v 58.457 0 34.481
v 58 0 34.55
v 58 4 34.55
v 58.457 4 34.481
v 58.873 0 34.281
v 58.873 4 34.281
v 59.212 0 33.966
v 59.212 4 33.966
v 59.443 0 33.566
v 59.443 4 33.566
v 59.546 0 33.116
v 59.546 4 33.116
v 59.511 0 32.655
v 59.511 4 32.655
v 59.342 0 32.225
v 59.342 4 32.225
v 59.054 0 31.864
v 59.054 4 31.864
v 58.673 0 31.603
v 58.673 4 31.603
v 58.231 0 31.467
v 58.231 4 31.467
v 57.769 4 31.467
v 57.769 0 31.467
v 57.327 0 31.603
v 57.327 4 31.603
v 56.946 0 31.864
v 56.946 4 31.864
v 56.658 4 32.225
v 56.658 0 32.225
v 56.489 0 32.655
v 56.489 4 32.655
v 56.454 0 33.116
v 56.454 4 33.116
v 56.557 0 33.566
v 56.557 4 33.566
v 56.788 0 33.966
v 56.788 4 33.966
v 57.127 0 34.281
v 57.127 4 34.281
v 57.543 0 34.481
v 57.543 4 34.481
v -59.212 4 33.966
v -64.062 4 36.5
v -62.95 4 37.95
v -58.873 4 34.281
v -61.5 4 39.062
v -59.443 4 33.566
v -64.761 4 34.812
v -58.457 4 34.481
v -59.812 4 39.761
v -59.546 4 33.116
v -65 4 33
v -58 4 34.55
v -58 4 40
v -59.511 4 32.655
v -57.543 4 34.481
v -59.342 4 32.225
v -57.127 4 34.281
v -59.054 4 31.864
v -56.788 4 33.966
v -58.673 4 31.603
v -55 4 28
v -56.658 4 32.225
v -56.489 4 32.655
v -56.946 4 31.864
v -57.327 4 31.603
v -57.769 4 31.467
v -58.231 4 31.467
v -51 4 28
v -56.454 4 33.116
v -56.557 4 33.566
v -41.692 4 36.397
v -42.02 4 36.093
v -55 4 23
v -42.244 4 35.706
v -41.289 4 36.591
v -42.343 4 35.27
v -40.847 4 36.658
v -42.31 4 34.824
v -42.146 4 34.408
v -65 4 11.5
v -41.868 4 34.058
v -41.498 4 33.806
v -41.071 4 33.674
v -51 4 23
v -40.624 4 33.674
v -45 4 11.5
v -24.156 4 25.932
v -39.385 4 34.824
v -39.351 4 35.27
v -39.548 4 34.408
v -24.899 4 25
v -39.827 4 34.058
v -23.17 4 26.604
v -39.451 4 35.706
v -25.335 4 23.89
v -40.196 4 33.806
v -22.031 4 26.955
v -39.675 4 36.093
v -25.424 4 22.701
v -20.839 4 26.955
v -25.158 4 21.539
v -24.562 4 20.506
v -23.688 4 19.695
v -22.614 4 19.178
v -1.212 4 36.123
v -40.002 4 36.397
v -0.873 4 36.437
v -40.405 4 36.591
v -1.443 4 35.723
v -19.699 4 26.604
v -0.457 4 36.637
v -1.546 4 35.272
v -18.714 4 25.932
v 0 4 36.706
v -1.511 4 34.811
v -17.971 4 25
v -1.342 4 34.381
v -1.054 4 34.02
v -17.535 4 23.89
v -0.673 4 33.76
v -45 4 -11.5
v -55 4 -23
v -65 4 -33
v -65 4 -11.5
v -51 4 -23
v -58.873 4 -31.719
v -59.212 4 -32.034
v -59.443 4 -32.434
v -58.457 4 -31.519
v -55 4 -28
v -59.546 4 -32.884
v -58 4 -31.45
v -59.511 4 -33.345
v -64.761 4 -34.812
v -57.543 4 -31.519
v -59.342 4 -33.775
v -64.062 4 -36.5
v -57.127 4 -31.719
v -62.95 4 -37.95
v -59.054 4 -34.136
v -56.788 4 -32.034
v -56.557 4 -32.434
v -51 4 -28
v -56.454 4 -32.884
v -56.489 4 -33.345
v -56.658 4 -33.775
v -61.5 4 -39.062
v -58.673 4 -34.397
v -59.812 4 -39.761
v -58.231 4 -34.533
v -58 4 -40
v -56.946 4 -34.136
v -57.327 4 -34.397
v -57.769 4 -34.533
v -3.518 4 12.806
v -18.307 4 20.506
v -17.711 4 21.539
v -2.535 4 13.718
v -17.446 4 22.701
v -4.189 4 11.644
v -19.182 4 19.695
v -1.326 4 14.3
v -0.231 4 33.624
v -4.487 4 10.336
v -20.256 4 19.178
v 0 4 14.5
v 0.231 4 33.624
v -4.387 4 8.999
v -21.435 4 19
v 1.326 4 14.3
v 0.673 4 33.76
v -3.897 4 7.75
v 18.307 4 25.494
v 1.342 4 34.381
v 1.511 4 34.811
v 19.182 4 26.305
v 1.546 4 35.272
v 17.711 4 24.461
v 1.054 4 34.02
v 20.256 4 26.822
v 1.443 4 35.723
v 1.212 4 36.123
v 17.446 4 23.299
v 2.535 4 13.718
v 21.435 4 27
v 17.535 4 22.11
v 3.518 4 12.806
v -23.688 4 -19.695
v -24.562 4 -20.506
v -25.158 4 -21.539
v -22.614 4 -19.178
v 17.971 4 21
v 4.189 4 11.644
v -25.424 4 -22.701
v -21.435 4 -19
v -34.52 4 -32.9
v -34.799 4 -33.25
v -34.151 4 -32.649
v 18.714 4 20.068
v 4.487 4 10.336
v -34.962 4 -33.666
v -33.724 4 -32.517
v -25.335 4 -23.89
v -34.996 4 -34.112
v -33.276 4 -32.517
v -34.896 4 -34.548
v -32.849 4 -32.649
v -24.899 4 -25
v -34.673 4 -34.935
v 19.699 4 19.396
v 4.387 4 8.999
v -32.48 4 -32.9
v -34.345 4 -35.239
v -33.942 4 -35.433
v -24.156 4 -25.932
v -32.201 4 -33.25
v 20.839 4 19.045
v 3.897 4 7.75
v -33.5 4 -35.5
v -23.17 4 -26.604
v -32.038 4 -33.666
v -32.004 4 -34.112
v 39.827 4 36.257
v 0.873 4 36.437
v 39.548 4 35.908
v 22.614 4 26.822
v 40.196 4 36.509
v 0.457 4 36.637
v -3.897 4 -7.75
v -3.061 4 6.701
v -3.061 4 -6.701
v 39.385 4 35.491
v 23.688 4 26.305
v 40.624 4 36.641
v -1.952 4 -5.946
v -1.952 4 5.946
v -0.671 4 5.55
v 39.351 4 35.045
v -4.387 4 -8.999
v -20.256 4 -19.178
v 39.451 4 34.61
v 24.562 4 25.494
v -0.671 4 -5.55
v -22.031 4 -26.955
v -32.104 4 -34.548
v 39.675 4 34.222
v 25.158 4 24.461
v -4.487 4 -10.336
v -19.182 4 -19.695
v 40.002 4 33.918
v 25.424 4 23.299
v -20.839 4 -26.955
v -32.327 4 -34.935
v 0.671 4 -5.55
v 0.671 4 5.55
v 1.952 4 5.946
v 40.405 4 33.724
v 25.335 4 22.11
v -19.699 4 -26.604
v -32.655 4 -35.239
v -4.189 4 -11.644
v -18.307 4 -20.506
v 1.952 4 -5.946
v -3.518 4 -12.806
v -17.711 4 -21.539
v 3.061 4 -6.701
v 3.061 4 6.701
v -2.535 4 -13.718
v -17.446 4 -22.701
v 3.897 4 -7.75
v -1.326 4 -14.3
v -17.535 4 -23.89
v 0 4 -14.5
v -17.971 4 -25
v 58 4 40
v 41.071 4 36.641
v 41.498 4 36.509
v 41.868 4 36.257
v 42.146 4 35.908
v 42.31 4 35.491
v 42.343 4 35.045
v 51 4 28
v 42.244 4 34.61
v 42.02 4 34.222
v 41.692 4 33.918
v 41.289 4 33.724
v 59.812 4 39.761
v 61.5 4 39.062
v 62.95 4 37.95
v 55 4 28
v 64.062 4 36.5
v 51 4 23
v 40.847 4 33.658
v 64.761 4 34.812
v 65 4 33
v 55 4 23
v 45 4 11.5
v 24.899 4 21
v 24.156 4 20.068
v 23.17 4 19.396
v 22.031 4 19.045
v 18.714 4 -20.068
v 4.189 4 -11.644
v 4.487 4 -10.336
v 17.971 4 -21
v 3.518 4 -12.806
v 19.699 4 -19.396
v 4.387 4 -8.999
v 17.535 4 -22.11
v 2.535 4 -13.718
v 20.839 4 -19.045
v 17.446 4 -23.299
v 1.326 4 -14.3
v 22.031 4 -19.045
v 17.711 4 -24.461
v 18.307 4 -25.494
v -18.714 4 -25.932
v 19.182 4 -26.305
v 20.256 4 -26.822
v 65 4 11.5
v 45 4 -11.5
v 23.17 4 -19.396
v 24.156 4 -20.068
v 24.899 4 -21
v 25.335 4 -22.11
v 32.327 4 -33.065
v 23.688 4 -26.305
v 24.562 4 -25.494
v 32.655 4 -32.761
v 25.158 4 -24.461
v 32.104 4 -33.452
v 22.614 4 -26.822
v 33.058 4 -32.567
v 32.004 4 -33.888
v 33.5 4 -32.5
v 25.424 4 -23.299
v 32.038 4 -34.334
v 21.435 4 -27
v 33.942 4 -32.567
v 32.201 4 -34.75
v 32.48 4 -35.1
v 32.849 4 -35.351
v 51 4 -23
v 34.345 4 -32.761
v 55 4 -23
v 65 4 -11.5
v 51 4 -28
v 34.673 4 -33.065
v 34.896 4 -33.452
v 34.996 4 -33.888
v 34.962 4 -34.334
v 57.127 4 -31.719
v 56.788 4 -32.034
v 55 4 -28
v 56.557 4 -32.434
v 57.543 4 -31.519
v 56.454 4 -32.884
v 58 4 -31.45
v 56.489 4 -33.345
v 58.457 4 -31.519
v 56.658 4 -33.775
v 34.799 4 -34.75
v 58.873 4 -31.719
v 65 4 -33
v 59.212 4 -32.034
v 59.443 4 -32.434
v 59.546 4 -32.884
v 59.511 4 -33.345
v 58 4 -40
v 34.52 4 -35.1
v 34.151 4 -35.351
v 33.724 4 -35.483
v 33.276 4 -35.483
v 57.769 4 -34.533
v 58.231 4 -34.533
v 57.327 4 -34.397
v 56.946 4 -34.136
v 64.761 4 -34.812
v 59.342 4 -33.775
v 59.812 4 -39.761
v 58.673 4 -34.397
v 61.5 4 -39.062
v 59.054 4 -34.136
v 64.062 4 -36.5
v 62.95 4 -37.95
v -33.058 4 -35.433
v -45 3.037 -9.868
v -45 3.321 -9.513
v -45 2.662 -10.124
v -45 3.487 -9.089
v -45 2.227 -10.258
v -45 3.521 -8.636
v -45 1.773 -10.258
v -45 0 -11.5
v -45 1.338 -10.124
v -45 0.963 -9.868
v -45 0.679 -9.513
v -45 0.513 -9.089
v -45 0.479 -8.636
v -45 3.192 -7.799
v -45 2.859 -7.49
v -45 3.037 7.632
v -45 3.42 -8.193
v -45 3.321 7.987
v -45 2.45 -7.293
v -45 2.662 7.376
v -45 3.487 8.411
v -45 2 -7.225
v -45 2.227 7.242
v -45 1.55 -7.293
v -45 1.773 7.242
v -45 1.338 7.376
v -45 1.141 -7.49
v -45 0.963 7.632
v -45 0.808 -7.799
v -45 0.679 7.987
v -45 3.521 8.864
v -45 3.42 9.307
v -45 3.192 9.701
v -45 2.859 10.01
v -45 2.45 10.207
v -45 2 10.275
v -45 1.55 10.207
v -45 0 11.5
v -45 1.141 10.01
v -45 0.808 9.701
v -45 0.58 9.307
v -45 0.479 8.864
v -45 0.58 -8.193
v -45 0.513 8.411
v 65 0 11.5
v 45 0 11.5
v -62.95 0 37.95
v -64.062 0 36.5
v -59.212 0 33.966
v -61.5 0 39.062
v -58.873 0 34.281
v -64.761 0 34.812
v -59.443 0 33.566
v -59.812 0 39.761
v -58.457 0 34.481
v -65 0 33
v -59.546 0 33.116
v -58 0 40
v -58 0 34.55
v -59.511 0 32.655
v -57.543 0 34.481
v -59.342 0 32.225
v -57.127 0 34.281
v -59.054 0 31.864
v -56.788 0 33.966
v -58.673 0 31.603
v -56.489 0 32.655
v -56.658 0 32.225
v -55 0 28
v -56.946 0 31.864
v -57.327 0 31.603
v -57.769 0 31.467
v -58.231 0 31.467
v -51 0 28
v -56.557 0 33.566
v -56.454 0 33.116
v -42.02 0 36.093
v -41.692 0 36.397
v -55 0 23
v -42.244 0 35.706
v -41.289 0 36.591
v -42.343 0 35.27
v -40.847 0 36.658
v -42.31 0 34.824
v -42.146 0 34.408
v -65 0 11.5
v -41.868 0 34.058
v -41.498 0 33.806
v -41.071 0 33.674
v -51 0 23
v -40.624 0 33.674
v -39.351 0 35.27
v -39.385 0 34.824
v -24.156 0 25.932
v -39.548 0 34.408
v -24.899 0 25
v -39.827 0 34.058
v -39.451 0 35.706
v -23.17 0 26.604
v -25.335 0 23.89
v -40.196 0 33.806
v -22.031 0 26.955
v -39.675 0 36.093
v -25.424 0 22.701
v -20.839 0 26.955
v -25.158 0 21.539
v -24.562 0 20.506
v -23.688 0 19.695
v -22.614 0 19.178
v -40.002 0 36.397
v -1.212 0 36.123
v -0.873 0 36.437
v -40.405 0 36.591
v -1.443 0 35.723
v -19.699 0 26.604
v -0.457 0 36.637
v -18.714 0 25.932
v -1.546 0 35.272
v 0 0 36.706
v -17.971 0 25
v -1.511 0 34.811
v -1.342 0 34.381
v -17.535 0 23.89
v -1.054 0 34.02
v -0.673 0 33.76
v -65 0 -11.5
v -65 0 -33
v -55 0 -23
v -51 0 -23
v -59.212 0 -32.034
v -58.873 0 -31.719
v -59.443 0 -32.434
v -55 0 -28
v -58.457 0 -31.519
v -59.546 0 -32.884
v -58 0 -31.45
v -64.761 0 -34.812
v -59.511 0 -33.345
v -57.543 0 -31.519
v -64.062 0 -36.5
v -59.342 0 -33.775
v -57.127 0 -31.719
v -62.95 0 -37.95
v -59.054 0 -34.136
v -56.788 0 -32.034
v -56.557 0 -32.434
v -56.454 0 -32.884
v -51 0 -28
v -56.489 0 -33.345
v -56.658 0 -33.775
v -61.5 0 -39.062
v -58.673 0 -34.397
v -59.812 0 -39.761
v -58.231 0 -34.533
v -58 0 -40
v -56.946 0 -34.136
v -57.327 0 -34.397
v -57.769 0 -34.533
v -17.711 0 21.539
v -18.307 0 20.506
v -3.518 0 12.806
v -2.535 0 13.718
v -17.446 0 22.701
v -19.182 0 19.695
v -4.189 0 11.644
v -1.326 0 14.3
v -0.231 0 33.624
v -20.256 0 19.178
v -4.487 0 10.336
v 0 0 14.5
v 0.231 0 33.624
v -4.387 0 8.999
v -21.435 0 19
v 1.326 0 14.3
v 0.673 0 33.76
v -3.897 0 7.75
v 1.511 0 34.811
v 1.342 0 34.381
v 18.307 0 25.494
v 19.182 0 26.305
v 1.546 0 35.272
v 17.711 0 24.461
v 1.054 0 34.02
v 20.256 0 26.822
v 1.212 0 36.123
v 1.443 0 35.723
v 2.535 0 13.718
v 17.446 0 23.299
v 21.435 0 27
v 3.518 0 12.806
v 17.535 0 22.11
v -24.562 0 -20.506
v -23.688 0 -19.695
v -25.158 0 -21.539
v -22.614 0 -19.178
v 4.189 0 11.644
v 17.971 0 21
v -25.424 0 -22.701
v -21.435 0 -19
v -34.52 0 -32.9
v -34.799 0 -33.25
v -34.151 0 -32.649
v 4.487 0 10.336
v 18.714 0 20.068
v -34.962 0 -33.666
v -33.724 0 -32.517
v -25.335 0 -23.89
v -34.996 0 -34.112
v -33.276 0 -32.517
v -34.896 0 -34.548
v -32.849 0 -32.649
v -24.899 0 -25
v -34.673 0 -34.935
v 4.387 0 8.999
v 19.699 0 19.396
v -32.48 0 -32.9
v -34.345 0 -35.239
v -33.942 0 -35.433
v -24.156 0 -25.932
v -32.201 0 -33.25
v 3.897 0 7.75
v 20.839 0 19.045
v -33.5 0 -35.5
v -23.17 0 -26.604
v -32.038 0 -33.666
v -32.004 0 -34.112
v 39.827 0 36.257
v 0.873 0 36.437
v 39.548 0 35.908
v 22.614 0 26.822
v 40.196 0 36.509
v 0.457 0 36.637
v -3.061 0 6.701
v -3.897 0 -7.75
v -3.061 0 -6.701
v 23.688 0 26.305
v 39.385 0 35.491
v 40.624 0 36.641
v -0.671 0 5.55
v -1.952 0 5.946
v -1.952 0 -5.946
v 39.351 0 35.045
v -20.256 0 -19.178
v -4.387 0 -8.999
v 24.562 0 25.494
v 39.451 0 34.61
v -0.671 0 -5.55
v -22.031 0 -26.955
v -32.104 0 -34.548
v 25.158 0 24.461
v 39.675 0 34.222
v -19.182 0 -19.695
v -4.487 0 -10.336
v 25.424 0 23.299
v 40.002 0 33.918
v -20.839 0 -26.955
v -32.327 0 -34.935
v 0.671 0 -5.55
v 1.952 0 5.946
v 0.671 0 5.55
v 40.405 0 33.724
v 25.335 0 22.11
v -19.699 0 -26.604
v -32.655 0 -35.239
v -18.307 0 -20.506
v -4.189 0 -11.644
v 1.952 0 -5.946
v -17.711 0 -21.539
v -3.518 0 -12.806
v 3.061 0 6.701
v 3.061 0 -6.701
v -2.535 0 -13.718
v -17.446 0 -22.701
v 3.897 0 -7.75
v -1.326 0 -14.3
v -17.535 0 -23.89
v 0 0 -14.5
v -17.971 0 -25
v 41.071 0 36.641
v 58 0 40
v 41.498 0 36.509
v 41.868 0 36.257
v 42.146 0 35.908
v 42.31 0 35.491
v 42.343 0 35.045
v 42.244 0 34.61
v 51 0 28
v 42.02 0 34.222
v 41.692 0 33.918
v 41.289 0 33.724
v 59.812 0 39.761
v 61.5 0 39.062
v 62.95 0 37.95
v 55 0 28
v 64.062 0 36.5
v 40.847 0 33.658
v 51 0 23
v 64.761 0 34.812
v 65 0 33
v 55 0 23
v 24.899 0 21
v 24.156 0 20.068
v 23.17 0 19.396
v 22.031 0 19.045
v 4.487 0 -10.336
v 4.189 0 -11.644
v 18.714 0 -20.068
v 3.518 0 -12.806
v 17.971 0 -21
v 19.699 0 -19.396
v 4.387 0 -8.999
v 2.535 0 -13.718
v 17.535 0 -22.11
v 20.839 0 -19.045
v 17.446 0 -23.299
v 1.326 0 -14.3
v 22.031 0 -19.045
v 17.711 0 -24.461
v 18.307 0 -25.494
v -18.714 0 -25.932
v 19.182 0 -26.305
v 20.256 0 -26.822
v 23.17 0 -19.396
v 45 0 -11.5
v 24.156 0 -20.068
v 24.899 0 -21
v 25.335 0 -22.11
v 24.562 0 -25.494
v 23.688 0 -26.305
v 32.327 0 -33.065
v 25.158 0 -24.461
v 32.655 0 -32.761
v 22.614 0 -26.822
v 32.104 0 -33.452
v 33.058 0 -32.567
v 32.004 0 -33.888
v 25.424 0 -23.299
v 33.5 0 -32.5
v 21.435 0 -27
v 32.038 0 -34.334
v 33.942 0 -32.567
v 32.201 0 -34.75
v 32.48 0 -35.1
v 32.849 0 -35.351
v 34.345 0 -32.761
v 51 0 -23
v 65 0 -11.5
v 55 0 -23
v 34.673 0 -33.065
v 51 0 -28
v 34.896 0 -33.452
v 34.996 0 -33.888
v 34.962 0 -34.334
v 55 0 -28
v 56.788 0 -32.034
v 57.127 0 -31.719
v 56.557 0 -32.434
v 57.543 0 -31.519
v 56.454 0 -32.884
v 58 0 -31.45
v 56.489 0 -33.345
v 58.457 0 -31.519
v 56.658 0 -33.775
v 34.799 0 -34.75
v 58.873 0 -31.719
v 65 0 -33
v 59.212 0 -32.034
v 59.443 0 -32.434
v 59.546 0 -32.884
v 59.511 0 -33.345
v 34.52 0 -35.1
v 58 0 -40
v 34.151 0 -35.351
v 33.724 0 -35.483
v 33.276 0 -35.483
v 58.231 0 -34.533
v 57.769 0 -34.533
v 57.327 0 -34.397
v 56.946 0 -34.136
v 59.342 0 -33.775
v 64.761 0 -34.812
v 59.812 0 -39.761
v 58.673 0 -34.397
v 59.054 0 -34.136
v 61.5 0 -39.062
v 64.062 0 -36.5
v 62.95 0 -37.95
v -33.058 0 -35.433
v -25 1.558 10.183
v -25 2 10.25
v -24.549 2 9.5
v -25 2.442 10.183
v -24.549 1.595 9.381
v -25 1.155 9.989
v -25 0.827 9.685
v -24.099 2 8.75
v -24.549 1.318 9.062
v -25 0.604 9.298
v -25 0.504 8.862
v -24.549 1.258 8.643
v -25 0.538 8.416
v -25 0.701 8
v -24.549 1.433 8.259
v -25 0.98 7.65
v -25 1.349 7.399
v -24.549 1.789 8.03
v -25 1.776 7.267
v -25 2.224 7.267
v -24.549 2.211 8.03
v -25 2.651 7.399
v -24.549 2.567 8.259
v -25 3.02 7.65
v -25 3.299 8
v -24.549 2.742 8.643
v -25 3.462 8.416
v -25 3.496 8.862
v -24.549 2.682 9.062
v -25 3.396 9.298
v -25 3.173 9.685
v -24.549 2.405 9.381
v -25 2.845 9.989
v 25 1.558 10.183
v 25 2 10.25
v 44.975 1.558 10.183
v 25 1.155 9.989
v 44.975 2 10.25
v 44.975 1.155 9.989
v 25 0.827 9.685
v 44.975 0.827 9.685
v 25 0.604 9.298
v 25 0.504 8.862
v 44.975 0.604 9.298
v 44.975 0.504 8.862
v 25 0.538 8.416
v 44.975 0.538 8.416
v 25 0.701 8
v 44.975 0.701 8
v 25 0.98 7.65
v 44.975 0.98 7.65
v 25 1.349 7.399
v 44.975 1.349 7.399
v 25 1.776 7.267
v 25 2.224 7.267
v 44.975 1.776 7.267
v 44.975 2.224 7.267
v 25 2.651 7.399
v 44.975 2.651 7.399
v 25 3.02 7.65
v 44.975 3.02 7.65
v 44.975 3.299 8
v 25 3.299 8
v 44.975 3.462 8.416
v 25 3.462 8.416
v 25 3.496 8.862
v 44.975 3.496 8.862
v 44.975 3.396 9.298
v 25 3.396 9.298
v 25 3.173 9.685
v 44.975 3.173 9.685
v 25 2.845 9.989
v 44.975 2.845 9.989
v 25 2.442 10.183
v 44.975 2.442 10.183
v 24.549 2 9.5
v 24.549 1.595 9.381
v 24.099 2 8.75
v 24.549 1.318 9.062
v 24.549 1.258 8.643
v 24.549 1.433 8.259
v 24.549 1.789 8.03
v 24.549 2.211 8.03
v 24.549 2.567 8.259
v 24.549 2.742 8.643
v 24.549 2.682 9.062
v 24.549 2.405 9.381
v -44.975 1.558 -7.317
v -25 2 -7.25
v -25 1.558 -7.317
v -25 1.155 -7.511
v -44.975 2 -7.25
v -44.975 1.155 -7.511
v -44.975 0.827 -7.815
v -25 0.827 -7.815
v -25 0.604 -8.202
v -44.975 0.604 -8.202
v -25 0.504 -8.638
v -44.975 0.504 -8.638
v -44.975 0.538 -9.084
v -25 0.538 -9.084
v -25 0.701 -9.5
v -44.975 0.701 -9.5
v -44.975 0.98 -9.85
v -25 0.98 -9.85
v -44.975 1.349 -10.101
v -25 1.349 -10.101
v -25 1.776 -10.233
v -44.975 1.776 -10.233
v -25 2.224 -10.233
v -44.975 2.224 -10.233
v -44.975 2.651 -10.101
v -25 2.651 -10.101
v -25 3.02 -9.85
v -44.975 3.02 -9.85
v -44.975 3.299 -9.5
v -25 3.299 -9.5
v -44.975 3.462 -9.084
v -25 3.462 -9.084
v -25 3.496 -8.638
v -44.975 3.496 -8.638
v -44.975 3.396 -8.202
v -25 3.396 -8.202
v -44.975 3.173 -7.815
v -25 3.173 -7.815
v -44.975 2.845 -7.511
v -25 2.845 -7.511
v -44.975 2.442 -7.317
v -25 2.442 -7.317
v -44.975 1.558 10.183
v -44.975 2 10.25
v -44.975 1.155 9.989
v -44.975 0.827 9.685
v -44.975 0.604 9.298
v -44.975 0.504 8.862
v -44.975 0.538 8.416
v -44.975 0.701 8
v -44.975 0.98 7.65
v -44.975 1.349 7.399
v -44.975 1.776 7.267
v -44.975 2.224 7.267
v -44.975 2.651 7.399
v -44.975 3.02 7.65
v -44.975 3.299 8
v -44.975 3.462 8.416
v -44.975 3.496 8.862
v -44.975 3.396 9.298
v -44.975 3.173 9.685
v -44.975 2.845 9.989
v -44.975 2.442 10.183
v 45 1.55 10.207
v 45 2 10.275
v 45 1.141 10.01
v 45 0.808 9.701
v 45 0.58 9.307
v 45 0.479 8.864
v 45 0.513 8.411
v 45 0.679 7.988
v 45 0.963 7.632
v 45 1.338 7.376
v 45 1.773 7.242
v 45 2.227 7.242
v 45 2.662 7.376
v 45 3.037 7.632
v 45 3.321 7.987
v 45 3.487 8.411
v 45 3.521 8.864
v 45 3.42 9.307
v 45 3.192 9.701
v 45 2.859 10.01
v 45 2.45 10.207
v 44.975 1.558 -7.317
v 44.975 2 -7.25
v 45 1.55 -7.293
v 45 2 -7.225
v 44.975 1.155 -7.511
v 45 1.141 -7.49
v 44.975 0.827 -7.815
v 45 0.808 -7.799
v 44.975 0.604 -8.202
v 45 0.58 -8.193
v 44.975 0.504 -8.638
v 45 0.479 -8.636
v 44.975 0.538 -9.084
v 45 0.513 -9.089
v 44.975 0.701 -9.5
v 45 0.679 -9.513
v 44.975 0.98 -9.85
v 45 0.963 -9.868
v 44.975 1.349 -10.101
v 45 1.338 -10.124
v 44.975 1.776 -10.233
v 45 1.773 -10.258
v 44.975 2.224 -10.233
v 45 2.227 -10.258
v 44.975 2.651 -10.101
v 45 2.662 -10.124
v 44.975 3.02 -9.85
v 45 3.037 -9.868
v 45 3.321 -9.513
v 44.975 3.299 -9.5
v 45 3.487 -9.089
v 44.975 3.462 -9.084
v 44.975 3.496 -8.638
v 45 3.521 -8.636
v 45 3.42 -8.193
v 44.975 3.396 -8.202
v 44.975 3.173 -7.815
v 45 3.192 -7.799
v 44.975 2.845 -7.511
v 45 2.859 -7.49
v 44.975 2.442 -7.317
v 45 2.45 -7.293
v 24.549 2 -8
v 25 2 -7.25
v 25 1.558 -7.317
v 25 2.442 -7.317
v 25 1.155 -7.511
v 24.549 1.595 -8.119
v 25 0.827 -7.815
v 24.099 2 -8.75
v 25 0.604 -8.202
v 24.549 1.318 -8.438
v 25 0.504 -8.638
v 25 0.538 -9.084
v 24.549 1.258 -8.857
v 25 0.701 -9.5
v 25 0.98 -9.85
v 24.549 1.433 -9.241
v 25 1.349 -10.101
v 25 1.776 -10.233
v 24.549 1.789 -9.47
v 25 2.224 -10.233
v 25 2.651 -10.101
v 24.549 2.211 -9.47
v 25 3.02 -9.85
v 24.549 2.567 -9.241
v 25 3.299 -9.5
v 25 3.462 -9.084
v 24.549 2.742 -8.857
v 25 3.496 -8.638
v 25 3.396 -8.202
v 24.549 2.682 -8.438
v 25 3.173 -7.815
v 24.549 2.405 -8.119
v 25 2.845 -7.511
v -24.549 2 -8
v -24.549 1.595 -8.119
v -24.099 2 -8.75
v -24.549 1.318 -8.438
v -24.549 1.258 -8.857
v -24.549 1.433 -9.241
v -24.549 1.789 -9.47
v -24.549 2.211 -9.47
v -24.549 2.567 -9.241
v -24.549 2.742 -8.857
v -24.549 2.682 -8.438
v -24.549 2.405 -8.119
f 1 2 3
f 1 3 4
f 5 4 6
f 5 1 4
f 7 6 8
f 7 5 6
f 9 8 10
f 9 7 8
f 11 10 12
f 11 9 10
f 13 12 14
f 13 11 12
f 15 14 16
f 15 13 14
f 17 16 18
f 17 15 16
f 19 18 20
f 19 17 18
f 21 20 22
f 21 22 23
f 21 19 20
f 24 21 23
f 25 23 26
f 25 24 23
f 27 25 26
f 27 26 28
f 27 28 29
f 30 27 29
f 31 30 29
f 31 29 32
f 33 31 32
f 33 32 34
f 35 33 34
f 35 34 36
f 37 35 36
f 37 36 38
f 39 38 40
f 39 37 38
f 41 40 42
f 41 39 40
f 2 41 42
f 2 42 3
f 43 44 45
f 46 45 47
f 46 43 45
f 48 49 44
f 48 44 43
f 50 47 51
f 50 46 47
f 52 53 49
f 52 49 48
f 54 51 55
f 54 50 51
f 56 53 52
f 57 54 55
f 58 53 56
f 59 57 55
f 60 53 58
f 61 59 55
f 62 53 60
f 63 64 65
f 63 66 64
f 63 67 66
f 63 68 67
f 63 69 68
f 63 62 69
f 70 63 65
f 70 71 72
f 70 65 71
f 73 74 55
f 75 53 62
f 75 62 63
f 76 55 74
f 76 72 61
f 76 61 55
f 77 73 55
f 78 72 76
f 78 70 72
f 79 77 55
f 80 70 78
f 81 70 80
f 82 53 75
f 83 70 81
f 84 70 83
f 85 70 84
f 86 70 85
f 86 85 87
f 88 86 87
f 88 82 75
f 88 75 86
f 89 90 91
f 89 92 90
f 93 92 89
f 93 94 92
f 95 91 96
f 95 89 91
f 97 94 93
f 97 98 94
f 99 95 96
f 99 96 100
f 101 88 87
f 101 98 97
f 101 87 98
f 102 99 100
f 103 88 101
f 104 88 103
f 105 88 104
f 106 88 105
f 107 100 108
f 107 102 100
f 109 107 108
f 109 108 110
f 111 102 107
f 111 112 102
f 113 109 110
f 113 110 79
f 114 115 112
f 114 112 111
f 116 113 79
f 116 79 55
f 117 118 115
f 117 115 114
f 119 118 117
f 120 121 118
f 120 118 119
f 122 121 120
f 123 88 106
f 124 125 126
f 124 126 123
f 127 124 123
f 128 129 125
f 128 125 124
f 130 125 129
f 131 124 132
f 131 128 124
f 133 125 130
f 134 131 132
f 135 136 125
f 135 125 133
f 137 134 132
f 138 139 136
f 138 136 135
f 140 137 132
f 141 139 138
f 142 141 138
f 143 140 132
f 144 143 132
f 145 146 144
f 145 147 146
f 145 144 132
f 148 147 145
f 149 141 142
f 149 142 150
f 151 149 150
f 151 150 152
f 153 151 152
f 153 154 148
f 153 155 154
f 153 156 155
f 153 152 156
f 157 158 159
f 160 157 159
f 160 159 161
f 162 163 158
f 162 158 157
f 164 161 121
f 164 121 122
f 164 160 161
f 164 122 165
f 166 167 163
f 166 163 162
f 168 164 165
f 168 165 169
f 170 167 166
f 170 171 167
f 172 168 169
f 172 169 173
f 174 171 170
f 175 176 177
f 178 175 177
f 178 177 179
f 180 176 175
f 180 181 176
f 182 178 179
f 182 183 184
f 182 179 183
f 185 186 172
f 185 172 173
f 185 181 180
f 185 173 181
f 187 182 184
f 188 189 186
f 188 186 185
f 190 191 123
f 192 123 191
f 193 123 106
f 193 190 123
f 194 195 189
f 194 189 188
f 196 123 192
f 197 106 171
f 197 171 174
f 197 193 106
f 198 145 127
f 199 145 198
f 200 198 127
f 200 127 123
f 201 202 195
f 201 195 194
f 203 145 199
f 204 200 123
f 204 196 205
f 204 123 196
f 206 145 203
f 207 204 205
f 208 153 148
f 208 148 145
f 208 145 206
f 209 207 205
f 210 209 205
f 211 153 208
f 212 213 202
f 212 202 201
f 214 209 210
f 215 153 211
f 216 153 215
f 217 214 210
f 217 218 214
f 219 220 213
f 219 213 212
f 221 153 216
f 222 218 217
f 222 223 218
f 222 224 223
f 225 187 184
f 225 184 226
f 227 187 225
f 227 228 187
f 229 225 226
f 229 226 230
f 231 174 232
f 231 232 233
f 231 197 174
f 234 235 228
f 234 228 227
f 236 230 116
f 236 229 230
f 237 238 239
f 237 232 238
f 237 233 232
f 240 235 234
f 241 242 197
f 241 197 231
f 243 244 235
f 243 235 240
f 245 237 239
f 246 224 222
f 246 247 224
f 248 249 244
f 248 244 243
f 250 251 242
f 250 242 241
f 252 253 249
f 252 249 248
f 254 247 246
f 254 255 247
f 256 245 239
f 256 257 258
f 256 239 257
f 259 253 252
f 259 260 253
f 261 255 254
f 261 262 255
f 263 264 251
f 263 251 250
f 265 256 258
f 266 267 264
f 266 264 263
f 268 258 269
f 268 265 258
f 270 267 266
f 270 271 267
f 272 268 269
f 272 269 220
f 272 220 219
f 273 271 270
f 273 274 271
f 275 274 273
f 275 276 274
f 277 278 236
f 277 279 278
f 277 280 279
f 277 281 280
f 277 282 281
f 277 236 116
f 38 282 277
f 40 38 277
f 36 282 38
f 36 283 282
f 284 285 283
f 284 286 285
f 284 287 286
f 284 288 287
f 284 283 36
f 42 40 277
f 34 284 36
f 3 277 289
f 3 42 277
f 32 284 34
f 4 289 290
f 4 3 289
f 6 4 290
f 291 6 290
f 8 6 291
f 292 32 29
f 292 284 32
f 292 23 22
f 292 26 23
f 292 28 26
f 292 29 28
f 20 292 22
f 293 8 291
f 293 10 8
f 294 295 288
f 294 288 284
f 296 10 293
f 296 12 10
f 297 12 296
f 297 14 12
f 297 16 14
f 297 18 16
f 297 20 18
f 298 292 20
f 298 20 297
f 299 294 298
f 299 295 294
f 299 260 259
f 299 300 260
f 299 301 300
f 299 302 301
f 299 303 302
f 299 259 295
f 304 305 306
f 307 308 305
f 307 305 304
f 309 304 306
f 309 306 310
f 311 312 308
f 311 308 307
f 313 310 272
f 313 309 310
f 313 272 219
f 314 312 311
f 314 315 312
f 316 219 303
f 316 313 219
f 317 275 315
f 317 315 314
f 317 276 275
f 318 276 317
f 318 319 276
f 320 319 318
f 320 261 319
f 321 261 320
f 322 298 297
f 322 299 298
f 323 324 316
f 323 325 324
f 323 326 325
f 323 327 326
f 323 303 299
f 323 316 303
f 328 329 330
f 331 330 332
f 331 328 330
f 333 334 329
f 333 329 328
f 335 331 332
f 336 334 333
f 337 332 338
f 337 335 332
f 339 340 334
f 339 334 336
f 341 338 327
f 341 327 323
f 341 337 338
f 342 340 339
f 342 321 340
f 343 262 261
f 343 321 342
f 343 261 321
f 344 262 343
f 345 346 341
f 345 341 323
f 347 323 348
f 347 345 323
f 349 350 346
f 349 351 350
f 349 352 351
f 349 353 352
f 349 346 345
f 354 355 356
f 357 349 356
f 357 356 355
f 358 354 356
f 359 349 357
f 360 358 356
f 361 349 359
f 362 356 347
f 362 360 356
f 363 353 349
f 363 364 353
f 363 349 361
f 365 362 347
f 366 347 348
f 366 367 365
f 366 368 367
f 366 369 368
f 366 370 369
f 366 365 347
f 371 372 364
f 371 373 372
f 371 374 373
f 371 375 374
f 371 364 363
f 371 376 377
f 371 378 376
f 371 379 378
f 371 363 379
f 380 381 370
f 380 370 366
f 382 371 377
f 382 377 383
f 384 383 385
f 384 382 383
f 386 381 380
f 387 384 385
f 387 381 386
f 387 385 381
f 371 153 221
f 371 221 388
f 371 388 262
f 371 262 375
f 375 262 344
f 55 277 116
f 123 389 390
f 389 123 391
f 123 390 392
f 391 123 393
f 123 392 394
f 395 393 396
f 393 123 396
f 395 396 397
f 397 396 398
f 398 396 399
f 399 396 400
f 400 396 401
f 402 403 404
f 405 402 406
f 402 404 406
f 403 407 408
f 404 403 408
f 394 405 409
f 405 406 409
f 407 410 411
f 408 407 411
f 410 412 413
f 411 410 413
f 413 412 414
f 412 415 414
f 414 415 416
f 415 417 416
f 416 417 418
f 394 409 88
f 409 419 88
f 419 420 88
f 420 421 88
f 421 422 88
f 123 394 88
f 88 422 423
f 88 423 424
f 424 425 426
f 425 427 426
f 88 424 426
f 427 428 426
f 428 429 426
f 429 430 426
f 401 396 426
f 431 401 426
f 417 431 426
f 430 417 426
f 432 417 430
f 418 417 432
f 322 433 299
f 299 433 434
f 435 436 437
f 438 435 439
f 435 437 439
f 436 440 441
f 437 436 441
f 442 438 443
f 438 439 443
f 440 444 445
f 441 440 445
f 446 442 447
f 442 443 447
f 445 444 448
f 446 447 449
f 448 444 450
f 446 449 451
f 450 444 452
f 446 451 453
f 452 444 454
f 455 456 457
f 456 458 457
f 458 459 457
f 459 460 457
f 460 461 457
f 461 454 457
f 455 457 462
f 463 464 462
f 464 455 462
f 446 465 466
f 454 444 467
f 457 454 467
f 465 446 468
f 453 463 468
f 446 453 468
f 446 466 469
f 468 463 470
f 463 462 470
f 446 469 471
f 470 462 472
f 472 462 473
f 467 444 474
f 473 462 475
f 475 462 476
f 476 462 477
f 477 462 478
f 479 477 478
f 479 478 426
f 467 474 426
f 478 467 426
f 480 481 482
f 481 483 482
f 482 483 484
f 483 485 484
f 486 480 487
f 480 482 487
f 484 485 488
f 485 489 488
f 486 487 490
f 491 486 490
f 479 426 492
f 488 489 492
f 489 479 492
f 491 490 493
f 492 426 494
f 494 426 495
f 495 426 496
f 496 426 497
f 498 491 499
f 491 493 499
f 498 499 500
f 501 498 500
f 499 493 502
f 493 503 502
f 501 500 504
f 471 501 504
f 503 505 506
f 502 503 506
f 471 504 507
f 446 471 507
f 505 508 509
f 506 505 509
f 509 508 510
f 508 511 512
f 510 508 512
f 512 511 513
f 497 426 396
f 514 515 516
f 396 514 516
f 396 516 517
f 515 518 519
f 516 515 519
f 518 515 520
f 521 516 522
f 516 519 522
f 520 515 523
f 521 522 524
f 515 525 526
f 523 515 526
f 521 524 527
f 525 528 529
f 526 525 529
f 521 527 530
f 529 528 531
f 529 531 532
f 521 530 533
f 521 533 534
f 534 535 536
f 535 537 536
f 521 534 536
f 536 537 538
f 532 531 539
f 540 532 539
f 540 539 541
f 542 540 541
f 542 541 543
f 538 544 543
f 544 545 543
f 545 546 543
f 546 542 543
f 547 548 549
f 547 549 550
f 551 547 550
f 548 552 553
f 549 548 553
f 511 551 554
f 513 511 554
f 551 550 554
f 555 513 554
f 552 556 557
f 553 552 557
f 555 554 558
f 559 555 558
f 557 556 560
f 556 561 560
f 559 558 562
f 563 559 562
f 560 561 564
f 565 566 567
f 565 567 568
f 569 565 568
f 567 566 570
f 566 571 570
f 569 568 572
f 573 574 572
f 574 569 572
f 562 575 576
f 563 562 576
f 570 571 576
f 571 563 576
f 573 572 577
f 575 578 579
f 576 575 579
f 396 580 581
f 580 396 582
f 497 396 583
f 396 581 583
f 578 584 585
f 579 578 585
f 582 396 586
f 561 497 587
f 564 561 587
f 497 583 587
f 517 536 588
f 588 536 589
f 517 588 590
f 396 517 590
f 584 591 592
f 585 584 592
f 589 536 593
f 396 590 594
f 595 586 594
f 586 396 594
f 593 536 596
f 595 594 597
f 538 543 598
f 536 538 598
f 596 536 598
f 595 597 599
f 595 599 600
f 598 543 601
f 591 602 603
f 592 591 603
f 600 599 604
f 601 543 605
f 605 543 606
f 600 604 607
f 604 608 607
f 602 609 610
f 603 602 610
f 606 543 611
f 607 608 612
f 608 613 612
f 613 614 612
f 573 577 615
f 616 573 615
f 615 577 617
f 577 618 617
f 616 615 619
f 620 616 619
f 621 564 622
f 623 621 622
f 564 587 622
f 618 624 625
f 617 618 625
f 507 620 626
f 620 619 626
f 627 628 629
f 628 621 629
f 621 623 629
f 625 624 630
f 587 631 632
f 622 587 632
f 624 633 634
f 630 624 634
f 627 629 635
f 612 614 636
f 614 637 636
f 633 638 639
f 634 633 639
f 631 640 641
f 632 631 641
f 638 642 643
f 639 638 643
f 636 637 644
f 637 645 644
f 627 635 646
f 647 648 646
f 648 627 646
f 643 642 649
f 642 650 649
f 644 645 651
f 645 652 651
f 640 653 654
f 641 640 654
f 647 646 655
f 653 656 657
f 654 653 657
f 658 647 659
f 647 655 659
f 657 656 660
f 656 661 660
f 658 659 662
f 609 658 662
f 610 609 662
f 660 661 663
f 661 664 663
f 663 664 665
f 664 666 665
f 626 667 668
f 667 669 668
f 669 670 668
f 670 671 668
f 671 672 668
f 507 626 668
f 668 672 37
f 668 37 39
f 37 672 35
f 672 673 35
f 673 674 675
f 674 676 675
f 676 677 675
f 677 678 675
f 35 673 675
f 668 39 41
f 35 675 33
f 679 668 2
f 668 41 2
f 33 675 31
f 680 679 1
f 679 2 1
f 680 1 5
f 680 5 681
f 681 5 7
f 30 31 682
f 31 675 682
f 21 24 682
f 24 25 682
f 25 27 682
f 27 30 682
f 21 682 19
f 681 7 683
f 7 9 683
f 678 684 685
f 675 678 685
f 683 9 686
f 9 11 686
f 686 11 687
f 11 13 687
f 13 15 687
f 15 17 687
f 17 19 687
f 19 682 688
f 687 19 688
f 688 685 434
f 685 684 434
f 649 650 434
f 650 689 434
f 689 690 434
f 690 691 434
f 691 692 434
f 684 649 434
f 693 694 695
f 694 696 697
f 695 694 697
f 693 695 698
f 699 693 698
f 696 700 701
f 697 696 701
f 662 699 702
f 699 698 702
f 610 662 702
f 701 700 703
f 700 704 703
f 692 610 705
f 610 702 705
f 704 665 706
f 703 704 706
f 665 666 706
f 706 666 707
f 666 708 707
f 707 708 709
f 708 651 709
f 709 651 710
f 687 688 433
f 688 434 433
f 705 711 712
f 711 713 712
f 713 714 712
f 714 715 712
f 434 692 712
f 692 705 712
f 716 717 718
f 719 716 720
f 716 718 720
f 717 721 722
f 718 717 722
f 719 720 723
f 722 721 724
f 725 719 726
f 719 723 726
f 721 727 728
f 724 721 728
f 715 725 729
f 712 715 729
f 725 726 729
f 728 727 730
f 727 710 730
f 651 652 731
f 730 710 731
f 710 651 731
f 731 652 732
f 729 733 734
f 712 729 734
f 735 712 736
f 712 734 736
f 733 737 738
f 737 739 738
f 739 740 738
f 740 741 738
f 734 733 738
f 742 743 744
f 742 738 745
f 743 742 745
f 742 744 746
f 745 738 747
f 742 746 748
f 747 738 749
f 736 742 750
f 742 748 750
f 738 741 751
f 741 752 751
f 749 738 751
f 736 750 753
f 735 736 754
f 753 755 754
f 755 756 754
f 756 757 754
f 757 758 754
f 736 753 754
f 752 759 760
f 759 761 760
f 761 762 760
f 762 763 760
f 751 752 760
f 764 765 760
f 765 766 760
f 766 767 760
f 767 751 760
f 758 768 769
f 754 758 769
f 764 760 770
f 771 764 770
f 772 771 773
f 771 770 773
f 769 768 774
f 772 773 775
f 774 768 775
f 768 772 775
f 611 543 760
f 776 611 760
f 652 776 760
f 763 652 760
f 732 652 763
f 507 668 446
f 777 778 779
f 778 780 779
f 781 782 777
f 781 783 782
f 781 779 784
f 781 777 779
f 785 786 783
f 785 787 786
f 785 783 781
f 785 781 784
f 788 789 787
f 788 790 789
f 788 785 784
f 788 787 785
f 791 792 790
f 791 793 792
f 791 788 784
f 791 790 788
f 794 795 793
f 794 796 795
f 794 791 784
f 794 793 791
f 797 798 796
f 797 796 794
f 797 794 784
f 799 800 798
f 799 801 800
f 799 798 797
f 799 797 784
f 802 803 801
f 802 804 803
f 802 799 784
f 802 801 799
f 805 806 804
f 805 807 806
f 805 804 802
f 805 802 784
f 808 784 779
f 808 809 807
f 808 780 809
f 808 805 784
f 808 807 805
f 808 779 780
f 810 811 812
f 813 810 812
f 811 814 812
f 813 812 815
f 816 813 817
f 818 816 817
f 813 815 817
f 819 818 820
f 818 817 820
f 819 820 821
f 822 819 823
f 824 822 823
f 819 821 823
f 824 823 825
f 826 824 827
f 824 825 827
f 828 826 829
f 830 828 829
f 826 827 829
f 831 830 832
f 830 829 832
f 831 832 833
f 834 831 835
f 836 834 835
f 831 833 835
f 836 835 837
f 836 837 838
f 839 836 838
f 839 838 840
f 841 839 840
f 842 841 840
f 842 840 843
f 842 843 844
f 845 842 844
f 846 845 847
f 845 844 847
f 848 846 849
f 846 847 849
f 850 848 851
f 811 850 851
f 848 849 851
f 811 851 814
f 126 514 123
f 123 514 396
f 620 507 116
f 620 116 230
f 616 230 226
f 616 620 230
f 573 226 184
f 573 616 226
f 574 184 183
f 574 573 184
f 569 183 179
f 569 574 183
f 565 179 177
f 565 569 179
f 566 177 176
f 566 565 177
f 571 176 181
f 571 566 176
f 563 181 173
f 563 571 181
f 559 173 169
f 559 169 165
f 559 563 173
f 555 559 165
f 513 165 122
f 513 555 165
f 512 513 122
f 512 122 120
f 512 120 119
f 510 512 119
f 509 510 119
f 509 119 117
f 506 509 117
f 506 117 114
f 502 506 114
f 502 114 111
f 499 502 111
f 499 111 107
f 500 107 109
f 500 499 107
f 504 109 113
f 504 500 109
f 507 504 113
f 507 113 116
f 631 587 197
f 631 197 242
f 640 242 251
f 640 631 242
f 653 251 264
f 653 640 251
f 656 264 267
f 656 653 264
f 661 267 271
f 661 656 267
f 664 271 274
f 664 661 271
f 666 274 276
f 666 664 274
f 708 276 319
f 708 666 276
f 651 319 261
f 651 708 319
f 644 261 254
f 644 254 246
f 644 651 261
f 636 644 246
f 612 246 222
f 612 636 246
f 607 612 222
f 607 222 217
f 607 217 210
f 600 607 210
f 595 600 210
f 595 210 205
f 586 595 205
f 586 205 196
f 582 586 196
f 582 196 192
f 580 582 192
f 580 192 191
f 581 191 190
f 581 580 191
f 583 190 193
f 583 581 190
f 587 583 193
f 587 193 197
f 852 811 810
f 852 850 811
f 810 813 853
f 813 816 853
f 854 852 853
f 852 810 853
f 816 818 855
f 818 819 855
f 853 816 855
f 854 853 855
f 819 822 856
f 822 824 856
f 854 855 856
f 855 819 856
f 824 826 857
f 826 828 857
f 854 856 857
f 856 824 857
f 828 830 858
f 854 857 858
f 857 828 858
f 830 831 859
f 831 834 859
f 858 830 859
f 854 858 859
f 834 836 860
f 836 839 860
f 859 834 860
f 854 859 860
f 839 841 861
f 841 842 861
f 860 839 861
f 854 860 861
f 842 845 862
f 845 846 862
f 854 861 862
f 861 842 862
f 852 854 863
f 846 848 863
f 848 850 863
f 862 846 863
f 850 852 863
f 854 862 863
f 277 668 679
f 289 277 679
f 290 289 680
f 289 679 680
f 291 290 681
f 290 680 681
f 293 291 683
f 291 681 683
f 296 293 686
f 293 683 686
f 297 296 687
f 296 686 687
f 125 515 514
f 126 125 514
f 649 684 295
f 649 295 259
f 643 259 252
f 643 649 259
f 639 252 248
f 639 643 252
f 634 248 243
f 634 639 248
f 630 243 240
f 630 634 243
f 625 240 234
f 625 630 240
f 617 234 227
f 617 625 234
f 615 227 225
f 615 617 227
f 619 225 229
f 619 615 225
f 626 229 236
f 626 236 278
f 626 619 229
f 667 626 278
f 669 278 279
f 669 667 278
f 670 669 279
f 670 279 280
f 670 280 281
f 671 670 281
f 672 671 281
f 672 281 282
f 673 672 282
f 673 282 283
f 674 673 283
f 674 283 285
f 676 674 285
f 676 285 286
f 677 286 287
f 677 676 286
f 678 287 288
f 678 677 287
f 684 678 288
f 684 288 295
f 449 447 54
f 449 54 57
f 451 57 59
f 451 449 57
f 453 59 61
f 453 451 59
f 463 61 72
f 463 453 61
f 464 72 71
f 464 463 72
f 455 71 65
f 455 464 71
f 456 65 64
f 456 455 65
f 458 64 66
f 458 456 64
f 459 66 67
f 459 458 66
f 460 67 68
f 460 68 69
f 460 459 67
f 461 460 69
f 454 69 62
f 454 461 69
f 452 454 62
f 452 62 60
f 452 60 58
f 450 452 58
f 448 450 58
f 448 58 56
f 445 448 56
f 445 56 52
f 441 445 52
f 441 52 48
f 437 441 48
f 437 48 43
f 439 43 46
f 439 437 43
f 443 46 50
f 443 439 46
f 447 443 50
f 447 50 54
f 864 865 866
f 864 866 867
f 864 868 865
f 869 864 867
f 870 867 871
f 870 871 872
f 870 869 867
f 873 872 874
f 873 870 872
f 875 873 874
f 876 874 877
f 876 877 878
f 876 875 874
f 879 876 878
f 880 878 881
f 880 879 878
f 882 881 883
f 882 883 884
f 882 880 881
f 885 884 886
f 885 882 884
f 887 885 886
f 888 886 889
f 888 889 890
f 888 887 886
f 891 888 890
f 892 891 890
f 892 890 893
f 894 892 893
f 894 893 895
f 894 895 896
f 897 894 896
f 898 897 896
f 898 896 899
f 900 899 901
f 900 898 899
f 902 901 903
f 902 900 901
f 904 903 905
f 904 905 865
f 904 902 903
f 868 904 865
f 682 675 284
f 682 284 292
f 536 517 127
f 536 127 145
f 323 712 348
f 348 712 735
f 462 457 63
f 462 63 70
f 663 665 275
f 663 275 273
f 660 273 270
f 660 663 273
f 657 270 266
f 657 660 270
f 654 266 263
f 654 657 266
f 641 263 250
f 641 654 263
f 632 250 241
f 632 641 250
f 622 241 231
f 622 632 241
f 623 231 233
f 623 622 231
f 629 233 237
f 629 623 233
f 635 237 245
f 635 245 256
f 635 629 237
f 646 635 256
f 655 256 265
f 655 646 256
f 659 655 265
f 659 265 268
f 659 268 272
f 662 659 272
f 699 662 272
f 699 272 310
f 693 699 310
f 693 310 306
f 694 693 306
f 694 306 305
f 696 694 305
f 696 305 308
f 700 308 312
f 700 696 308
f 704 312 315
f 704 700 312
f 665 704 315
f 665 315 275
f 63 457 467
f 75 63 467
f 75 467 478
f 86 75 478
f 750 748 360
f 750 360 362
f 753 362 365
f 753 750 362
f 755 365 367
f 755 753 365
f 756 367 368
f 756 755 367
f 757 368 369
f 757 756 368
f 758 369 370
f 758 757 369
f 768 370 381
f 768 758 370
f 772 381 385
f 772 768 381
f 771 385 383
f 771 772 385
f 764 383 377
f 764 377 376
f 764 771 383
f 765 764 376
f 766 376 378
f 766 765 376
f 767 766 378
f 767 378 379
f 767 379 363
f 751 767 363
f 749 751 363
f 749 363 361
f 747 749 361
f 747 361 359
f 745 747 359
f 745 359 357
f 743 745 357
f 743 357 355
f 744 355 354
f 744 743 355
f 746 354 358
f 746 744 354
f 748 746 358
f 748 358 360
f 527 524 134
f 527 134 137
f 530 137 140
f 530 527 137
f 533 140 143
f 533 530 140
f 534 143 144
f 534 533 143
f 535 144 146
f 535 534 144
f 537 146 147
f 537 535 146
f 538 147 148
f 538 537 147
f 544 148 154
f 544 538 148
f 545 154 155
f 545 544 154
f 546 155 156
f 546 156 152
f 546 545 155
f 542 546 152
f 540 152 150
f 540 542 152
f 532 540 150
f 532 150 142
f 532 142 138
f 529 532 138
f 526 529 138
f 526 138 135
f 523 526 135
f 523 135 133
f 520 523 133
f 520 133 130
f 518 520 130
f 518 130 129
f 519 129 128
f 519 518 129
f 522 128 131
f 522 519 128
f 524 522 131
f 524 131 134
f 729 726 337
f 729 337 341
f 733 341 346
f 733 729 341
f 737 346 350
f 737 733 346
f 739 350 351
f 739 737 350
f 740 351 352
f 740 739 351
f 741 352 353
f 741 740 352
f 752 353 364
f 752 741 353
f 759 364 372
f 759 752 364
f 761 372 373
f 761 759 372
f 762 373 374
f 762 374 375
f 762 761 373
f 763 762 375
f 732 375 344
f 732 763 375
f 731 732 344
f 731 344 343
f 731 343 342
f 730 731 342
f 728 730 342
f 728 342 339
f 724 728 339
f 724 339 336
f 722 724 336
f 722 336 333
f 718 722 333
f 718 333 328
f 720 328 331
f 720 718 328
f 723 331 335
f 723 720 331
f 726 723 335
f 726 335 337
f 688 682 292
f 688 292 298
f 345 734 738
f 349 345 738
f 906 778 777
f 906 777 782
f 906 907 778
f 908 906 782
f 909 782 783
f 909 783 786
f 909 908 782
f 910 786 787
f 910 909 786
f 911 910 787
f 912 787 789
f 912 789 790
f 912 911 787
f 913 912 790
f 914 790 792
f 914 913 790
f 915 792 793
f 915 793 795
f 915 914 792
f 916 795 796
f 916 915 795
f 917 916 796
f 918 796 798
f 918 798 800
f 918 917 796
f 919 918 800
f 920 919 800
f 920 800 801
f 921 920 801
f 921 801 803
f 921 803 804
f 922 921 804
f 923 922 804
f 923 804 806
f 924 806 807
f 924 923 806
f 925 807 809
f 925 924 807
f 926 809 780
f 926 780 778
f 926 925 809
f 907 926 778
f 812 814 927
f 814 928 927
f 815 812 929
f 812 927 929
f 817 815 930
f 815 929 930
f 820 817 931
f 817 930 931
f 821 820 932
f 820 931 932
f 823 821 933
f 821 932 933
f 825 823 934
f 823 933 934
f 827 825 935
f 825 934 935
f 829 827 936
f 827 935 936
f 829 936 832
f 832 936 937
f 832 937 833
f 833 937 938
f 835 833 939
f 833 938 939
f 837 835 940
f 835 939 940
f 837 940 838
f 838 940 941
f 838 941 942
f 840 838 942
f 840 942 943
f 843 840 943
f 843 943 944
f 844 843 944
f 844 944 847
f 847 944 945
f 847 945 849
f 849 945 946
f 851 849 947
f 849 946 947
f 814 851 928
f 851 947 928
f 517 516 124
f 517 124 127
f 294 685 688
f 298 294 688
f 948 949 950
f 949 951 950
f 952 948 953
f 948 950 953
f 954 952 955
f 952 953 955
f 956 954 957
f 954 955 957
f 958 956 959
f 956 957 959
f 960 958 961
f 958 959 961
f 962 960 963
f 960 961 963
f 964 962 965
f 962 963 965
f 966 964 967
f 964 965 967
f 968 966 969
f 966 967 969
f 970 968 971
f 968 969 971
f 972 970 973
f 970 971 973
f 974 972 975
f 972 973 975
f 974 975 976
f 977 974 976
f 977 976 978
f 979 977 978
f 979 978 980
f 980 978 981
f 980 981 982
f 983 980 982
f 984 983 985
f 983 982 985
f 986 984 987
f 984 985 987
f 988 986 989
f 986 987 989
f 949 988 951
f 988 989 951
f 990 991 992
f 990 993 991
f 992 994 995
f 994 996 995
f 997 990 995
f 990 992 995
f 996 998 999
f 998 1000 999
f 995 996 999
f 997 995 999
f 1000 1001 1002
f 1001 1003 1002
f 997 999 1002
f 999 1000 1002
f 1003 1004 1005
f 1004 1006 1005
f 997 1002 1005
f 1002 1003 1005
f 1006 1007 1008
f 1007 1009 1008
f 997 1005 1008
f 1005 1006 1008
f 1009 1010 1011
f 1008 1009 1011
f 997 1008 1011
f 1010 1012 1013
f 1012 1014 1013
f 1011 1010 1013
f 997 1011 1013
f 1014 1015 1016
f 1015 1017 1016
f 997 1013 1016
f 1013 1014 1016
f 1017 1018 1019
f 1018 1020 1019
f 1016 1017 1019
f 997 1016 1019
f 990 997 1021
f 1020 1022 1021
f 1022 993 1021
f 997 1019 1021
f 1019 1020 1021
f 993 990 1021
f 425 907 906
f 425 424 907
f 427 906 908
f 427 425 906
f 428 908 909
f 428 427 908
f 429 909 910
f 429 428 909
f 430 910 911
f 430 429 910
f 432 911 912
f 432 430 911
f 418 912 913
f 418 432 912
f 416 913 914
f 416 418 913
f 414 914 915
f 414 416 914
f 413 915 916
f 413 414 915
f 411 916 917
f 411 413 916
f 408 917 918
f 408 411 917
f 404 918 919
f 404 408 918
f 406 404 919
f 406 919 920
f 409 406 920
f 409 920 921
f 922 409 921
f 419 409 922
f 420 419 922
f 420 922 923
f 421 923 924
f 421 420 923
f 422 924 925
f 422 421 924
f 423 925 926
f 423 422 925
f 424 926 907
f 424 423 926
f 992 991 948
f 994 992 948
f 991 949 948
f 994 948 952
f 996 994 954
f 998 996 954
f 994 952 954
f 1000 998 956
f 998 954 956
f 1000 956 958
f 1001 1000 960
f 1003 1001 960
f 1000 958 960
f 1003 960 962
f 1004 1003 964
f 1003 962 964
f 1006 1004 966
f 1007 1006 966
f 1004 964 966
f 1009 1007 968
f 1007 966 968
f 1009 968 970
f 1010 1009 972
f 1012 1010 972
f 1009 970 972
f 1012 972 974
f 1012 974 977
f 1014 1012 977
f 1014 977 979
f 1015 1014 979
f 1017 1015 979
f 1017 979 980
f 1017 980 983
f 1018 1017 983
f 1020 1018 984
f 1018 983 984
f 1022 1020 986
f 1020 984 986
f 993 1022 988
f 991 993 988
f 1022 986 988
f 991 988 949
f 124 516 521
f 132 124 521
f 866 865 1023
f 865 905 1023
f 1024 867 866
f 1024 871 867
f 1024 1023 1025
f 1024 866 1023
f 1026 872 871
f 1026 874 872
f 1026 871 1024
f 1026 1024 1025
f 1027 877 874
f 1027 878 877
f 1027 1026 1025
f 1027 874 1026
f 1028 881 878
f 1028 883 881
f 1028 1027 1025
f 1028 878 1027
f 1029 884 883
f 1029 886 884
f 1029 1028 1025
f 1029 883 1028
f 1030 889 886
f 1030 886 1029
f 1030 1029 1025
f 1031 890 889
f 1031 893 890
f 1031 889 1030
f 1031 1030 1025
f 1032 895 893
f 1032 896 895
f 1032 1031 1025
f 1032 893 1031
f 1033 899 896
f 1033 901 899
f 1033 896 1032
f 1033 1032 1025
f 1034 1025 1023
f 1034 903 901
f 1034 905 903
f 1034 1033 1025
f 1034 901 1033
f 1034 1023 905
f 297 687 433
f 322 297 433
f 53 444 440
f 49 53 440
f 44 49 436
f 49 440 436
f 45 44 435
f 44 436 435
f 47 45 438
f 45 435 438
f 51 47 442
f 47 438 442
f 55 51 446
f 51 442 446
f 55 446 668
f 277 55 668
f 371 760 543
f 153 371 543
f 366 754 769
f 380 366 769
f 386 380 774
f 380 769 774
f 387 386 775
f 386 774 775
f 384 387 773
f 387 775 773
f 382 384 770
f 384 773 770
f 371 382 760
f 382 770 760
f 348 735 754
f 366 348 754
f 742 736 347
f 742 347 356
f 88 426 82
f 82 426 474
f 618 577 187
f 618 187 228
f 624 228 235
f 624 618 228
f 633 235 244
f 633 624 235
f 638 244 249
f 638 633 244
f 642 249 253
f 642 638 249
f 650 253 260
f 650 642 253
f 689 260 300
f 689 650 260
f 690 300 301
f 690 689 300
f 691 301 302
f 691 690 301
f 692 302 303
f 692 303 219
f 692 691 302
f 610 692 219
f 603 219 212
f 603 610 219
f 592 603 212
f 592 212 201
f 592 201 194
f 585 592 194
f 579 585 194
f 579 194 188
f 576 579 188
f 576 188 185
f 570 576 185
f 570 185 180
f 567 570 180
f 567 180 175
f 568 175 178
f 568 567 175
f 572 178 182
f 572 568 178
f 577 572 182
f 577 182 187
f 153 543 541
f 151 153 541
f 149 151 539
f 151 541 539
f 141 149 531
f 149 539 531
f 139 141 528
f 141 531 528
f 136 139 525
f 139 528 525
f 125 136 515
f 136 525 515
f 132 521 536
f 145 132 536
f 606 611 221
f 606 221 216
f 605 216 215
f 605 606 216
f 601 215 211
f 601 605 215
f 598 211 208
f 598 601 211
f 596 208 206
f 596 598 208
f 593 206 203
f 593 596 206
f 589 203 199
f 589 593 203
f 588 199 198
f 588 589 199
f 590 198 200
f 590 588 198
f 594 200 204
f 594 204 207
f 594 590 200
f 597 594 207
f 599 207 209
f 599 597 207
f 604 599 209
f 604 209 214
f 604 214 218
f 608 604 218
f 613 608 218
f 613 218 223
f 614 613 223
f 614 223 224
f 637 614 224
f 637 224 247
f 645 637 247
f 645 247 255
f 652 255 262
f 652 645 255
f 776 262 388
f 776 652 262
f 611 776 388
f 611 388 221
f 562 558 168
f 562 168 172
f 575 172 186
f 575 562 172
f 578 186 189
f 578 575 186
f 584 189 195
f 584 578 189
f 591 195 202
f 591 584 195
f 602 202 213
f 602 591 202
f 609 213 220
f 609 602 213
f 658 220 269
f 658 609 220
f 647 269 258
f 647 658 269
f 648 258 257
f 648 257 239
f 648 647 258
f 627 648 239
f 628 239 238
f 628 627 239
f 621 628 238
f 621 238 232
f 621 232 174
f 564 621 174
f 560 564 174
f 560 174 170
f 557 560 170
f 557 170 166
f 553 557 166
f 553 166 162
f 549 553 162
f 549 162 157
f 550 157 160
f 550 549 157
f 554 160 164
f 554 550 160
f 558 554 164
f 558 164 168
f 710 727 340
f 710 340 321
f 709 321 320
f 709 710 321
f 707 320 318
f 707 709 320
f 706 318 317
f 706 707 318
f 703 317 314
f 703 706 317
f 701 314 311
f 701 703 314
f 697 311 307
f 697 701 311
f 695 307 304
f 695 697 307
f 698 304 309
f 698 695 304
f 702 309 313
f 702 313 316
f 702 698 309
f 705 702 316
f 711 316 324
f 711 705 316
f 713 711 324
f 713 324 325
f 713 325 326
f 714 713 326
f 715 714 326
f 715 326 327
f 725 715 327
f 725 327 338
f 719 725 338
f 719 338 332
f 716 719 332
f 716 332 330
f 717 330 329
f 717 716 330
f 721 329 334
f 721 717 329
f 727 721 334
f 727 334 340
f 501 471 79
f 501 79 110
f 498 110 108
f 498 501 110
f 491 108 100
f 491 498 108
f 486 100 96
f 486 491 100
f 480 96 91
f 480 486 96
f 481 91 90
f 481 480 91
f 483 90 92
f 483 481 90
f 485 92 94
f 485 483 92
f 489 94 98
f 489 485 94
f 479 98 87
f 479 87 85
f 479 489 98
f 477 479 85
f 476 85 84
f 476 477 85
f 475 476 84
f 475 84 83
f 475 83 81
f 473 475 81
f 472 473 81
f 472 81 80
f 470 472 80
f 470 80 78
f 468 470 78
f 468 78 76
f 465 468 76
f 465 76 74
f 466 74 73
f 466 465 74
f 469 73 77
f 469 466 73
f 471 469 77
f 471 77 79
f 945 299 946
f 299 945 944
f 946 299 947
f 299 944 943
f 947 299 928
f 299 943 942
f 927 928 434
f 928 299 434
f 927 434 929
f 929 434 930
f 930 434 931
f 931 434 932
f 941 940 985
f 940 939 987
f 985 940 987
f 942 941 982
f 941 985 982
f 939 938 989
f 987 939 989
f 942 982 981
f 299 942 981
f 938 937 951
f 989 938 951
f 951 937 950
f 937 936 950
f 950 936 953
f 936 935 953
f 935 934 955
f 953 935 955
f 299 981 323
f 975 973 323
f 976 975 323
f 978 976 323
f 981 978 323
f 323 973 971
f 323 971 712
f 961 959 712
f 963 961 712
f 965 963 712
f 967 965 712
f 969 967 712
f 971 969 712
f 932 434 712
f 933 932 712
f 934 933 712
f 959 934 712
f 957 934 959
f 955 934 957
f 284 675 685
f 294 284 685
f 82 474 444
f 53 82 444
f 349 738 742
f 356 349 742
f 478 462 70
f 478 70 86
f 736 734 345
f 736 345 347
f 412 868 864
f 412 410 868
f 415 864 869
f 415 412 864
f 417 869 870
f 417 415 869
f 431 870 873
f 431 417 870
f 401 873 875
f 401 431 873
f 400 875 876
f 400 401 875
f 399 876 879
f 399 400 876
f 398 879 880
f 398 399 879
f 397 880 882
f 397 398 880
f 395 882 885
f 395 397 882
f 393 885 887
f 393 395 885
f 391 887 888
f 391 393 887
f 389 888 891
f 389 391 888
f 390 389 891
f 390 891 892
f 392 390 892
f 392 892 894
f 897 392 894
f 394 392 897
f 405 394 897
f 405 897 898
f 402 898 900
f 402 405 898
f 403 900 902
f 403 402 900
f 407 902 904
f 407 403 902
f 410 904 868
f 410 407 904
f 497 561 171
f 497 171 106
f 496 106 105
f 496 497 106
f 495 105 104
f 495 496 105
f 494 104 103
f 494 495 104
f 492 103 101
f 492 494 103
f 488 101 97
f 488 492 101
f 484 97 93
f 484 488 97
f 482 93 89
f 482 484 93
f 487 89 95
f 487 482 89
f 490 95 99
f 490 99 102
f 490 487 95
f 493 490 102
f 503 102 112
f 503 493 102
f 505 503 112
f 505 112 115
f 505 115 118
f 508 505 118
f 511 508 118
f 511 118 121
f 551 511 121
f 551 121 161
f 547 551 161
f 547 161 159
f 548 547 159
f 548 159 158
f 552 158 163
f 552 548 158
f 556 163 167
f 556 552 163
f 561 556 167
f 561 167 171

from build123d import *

# Parameters (mm, degrees)
SKETCH1_R                = 1.55
SKETCH1_R_2              = 1.5
SKETCH1_R_3              = 4.5
SKETCH1_R_4              = 4
SKETCH1_W                = 4
SKETCH1_H                = 5
BOSS_EXTRUDE1_DEPTH      = 4
OTW_R_3_0_3_1_AT_2_COUNT = 2
OTW_R_3_0_3_1_AT_2_PITCH = 17.5


with BuildPart() as part:
    # Sketch1 → Boss-Extrude1 (new body)
    with BuildSketch(Plane(origin=(0, 0, 0), x_dir=(1, 0, 0), z_dir=(0, 1, 0))):
        with BuildLine():
            Line((45, -11.5), (45, 11.5))
            Line((45, 11.5), (65, 11.5))
            Line((65, 11.5), (65, 33))
            ThreePointArc((65, 33), (62.949747468, 37.949747468), (58, 40))
            Line((58, 40), (-58, 40))
            ThreePointArc((-58, 40), (-62.949747468, 37.949747468), (-65, 33))
            Line((-65, 33), (-65, 11.5))
            Line((-65, 11.5), (-45, 11.5))
            Line((-45, 11.5), (-45, -11.5))
            Line((-45, -11.5), (-65, -11.5))
            Line((-65, -11.5), (-65, -33))
            ThreePointArc((-65, -33), (-62.949747468, -37.949747468), (-58, -40))
            Line((-58, -40), (58, -40))
            ThreePointArc((58, -40), (62.949747468, -37.949747468), (65, -33))
            Line((65, -33), (65, -11.5))
            Line((65, -11.5), (45, -11.5))
        make_face()
        with Locations(Location((58, 33, 0), (0, 0, 270))):
            Circle(SKETCH1_R, mode=Mode.SUBTRACT)
        with Locations(Location((58, -33, 0), (0, 0, 270))):
            Circle(SKETCH1_R, mode=Mode.SUBTRACT)
        with Locations(Location((-58, -33, 0), (0, 0, 270))):
            Circle(SKETCH1_R, mode=Mode.SUBTRACT)
        with Locations(Location((-58, 33, 0), (0, 0, 270))):
            Circle(SKETCH1_R, mode=Mode.SUBTRACT)
        with Locations(Location((33.5, 34, 0), (0, 0, 270))):
            Circle(SKETCH1_R_2, mode=Mode.SUBTRACT)
        with Locations(Location((-33.5, 34, 0), (0, 0, 90))):
            Circle(SKETCH1_R_2, mode=Mode.SUBTRACT)
        with Locations(Location((-40.847291444, -35.157580257, 0), (0, 0, 270))):
            Circle(SKETCH1_R_2, mode=Mode.SUBTRACT)
        with Locations(Location((0, -35.15624759, 0), (0, 0, 270))):
            Circle(SKETCH1_R, mode=Mode.SUBTRACT)
        with Locations(Location((40.847291444, -35.157580257, 0), (0, 0, 90))):
            Circle(SKETCH1_R_2, mode=Mode.SUBTRACT)
        with Locations(Location((0, -10, 0), (0, 0, 270))):
            Circle(SKETCH1_R_3, mode=Mode.SUBTRACT)
        with Locations(Location((0, 10, 0), (0, 0, 90))):
            Circle(SKETCH1_R_3, mode=Mode.SUBTRACT)
        with Locations(Location((21.434820624, -23, 0), (0, 0, 270))):
            Circle(SKETCH1_R_4, mode=Mode.SUBTRACT)
        with Locations(Location((-21.434820624, -23, 0), (0, 0, 90))):
            Circle(SKETCH1_R_4, mode=Mode.SUBTRACT)
        with Locations(Location((-21.434820624, 23, 0), (0, 0, 270))):
            Circle(SKETCH1_R_4, mode=Mode.SUBTRACT)
        with Locations(Location((21.434820624, 23, 0), (0, 0, 90))):
            Circle(SKETCH1_R_4, mode=Mode.SUBTRACT)
        with Locations((53, -25.5)):
            Rectangle(SKETCH1_W, SKETCH1_H, mode=Mode.SUBTRACT)
        with Locations((53, 25.5)):
            Rectangle(SKETCH1_W, SKETCH1_H, mode=Mode.SUBTRACT)
        with Locations((-53, -25.5)):
            Rectangle(SKETCH1_W, SKETCH1_H, mode=Mode.SUBTRACT)
        with Locations((-53, 25.5)):
            Rectangle(SKETCH1_W, SKETCH1_H, mode=Mode.SUBTRACT)
    extrude(amount=BOSS_EXTRUDE1_DEPTH)

    # Szkic5 → Otwór Ø3.0 (3)1 (revolve, cut)
    with BuildSketch(Plane(origin=(-45, 2, -8.75), x_dir=(0, 0, 1), z_dir=(0, 1, 0))):
        Polygon((0, 0), (0, 20.901290929), (1.5, 20), (1.5, 0.025), (1.525, 0), align=None)
    otw_r_3_0_3_1 = revolve(axis=Axis((-51.35, 2, -8.75), (1, 0, 0)), mode=Mode.SUBTRACT)

    # Otwór Ø3.0 (3)1 at 2: Otwór Ø3.0 (3)1 ×2
    with Locations(*[(0, 0, i * OTW_R_3_0_3_1_AT_2_PITCH) for i in range(1, OTW_R_3_0_3_1_AT_2_COUNT)]):
        add(otw_r_3_0_3_1, mode=Mode.SUBTRACT)

    # Lustro1: Otwór Ø3.0 (3)1 across plane
    add(otw_r_3_0_3_1.mirror(Plane(origin=(0, 0, 0), x_dir=(0, 0, 1), z_dir=(1, 0, 0))), mode=Mode.SUBTRACT)

    # Lustro1 copy 1 sketch → Lustro1 copy 1 (revolve, cut)
    with BuildSketch(Plane(origin=(45, 2, 8.75), x_dir=(0, 0, 1), z_dir=(0, 1, 0))):
        Polygon((0, 0), (0, -20.901290929), (1.5, -20), (1.5, -0.025), (1.525, 0), align=None)
    revolve(axis=Axis((51.35, 2, 8.75), (1, 0, 0)), mode=Mode.SUBTRACT)


solid = part.part
